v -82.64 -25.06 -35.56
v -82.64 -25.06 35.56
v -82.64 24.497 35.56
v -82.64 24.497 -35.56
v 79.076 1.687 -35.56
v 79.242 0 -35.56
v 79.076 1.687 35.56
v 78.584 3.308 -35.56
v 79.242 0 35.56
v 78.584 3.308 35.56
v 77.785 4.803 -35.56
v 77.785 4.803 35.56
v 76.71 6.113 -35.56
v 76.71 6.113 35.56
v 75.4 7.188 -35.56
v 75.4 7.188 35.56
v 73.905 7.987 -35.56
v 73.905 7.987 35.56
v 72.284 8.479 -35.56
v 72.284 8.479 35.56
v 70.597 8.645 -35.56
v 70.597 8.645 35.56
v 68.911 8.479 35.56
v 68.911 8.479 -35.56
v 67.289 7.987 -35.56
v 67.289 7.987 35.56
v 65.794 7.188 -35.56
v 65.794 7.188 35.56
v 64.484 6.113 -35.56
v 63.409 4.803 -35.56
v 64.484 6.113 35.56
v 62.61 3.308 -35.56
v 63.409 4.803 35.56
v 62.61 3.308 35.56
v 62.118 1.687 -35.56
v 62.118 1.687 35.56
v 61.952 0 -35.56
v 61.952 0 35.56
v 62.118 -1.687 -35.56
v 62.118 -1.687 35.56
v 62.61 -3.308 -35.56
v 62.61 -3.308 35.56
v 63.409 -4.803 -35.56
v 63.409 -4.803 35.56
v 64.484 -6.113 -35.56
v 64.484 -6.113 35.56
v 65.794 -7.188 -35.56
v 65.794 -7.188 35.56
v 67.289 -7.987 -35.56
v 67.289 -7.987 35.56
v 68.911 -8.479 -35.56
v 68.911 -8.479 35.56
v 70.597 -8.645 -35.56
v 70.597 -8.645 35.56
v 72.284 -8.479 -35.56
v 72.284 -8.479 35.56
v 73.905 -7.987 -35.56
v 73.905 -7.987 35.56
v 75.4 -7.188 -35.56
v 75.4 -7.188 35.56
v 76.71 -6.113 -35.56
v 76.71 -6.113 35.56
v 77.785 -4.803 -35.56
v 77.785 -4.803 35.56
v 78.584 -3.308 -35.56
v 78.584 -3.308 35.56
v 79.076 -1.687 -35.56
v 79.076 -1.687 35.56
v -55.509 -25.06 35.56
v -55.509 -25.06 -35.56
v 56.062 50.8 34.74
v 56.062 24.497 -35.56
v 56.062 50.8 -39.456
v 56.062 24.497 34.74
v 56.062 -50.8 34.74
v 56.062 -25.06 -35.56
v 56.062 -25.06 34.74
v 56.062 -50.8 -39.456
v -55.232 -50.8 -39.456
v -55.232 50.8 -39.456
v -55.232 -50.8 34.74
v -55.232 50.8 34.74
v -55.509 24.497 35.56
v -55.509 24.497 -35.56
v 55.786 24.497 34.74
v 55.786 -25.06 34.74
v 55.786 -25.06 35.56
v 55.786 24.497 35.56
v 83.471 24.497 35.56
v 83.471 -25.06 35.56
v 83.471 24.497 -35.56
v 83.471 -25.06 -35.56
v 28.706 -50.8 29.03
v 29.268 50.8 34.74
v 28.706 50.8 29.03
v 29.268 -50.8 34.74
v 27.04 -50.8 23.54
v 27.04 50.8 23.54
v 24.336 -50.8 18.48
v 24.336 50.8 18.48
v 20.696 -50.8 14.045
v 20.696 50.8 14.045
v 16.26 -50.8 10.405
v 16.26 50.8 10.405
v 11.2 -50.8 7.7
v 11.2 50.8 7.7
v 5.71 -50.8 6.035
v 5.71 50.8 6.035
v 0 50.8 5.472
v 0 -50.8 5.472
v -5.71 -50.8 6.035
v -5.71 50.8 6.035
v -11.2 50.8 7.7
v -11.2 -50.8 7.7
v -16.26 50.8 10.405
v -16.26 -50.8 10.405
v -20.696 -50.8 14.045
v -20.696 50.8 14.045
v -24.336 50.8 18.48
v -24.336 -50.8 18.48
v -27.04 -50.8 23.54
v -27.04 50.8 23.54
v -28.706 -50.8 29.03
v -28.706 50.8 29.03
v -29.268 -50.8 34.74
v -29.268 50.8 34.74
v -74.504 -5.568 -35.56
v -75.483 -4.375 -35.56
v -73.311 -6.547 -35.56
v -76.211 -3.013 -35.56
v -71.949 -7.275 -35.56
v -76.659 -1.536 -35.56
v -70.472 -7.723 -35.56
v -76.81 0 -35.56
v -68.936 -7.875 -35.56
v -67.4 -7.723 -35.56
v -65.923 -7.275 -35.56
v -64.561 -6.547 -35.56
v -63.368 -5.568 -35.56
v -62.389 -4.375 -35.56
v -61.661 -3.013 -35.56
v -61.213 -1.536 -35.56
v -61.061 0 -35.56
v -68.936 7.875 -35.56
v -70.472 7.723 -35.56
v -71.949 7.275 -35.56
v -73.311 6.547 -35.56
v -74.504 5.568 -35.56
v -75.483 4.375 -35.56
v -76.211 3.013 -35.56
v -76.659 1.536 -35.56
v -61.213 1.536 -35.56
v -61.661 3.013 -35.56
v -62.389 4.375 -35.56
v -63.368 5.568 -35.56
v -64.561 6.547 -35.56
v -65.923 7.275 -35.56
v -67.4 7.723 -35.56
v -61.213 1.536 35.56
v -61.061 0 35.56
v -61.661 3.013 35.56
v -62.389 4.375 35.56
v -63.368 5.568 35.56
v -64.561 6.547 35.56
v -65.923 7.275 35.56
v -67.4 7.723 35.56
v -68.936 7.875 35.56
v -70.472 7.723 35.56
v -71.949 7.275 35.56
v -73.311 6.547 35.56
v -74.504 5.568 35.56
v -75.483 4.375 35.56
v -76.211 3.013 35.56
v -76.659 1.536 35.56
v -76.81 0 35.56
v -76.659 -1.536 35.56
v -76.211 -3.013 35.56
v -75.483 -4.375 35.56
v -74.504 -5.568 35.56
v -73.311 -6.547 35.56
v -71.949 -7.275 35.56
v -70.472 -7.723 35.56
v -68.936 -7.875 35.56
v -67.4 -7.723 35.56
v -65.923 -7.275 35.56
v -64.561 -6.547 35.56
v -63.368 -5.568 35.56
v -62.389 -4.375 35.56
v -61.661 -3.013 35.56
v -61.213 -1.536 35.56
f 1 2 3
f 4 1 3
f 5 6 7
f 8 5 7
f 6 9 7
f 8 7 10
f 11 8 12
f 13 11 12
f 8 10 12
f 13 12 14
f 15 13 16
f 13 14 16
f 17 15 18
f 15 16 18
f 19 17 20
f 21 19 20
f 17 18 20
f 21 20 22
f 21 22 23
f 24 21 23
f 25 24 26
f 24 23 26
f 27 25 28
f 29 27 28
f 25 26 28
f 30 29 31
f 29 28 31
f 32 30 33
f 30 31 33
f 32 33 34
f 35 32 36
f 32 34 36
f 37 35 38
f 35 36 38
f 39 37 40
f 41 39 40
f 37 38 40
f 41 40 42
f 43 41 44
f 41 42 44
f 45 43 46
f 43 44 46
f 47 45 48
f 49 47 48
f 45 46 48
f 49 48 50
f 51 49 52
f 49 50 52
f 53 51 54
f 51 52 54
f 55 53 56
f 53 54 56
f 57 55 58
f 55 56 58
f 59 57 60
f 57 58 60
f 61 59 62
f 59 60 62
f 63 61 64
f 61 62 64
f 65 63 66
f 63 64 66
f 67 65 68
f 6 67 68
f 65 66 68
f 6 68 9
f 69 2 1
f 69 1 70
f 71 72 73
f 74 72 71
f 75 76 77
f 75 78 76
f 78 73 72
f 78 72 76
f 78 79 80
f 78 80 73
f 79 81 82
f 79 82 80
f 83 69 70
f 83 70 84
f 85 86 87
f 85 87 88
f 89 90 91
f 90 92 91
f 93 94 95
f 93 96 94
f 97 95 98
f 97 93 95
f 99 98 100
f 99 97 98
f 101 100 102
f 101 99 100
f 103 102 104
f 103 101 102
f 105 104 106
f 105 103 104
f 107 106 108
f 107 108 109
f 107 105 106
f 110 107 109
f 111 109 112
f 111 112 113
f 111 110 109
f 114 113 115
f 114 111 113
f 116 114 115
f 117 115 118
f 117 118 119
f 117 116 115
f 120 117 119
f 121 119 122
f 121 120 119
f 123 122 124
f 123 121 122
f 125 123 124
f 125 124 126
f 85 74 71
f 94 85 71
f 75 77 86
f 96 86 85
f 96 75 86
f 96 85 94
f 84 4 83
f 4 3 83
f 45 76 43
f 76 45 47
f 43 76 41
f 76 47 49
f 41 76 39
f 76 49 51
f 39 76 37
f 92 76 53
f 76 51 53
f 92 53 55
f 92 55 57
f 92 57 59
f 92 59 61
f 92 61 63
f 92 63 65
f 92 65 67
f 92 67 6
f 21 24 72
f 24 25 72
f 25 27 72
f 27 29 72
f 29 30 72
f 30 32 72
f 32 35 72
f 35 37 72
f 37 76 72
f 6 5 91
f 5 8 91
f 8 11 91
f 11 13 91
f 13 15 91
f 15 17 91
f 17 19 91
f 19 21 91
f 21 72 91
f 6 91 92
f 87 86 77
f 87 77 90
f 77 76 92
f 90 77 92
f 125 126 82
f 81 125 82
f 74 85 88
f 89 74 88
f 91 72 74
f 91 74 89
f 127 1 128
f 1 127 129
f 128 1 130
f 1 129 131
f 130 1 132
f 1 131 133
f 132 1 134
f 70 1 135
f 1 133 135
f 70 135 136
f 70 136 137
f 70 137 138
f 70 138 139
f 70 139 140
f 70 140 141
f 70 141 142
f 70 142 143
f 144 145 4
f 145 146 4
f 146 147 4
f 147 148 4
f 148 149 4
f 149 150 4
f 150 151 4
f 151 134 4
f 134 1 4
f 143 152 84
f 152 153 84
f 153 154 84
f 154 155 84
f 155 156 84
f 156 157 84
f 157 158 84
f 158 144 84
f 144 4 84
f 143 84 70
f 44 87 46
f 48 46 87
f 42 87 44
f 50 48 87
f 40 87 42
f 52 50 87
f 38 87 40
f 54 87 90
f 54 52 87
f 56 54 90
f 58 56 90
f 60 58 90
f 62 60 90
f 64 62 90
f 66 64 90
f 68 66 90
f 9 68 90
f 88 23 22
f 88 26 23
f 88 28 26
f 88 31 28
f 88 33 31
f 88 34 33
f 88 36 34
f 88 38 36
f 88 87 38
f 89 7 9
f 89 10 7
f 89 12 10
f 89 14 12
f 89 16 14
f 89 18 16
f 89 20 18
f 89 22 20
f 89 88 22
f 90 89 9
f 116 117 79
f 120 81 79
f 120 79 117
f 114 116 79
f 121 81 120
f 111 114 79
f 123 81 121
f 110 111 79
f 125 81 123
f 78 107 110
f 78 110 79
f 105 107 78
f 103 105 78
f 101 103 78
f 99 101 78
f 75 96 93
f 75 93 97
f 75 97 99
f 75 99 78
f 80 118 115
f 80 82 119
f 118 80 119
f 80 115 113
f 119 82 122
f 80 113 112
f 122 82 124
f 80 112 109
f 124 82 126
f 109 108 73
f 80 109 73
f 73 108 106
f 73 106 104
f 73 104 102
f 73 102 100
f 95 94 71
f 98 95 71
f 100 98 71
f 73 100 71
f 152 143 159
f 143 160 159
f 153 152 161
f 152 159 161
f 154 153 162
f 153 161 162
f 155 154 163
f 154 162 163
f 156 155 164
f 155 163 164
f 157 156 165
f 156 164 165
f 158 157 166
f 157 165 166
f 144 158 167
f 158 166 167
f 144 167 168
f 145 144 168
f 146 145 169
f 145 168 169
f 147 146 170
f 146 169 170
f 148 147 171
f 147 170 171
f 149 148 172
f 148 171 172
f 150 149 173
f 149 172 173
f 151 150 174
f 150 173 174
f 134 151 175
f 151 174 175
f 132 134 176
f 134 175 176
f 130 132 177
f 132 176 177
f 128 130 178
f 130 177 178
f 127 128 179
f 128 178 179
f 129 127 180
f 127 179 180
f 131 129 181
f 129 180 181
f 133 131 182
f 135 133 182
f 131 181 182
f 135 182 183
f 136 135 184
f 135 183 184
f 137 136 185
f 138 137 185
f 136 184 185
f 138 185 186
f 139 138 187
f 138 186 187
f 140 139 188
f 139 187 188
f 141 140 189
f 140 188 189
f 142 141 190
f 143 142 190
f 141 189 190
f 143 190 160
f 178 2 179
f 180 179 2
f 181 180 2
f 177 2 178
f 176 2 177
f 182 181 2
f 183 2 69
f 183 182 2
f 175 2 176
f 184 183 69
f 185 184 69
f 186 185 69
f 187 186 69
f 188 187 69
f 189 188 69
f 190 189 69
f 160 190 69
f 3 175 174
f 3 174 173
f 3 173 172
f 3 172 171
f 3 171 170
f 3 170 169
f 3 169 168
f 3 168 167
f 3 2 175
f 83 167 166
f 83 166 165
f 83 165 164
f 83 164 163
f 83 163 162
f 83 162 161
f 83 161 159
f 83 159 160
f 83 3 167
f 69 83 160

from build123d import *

# Parameters (mm, degrees)
F1_DEPTH = 50.8
F2_W     = 27.685125
F2_H     = 49.556367
F2_W_2   = 27.13142
F3_DEPTH = 35.56
F4_R     = 7.874517
F4_R_2   = 8.645014
F5_DEPTH = 50.8


with BuildPart() as f1:
    # F0 (on Front) → F1 (new body, symmetric)
    with BuildSketch(Plane.XZ):
        with BuildLine():
            Line((-29.268097, 34.740344), (-55.231817, 34.740344))
            Line((-55.231817, 34.740344), (-55.231817, -39.455783))
            Line((-55.231817, -39.455783), (56.062367, -39.455783))
            Line((56.062367, -39.455783), (56.062367, 34.740344))
            Line((56.062367, 34.740344), (29.268097, 34.740344))
            ThreePointArc((29.268097, 34.740344), (0, 5.472246), (-29.268097, 34.740344))
        make_face()
    extrude(amount=F1_DEPTH, both=True)

    # F2 (on Top) → F3 (join, symmetric)
    with BuildSketch(Plane.XY):
        with Locations((69.62808, -0.281334)):
            Rectangle(F2_W, F2_H)
        with Locations((-69.074379, -0.281334)):
            Rectangle(F2_W_2, F2_H)
    extrude(amount=F3_DEPTH, both=True)

    # F4 (on Top) → F5 (cut, symmetric)
    with BuildSketch(Plane.XY):
        with Locations((-68.935953, 0)):
            Circle(F4_R)
        with Locations((70.59706, 0)):
            Circle(F4_R_2)
    extrude(amount=F5_DEPTH, both=True, mode=Mode.SUBTRACT)


solid = f1.part
